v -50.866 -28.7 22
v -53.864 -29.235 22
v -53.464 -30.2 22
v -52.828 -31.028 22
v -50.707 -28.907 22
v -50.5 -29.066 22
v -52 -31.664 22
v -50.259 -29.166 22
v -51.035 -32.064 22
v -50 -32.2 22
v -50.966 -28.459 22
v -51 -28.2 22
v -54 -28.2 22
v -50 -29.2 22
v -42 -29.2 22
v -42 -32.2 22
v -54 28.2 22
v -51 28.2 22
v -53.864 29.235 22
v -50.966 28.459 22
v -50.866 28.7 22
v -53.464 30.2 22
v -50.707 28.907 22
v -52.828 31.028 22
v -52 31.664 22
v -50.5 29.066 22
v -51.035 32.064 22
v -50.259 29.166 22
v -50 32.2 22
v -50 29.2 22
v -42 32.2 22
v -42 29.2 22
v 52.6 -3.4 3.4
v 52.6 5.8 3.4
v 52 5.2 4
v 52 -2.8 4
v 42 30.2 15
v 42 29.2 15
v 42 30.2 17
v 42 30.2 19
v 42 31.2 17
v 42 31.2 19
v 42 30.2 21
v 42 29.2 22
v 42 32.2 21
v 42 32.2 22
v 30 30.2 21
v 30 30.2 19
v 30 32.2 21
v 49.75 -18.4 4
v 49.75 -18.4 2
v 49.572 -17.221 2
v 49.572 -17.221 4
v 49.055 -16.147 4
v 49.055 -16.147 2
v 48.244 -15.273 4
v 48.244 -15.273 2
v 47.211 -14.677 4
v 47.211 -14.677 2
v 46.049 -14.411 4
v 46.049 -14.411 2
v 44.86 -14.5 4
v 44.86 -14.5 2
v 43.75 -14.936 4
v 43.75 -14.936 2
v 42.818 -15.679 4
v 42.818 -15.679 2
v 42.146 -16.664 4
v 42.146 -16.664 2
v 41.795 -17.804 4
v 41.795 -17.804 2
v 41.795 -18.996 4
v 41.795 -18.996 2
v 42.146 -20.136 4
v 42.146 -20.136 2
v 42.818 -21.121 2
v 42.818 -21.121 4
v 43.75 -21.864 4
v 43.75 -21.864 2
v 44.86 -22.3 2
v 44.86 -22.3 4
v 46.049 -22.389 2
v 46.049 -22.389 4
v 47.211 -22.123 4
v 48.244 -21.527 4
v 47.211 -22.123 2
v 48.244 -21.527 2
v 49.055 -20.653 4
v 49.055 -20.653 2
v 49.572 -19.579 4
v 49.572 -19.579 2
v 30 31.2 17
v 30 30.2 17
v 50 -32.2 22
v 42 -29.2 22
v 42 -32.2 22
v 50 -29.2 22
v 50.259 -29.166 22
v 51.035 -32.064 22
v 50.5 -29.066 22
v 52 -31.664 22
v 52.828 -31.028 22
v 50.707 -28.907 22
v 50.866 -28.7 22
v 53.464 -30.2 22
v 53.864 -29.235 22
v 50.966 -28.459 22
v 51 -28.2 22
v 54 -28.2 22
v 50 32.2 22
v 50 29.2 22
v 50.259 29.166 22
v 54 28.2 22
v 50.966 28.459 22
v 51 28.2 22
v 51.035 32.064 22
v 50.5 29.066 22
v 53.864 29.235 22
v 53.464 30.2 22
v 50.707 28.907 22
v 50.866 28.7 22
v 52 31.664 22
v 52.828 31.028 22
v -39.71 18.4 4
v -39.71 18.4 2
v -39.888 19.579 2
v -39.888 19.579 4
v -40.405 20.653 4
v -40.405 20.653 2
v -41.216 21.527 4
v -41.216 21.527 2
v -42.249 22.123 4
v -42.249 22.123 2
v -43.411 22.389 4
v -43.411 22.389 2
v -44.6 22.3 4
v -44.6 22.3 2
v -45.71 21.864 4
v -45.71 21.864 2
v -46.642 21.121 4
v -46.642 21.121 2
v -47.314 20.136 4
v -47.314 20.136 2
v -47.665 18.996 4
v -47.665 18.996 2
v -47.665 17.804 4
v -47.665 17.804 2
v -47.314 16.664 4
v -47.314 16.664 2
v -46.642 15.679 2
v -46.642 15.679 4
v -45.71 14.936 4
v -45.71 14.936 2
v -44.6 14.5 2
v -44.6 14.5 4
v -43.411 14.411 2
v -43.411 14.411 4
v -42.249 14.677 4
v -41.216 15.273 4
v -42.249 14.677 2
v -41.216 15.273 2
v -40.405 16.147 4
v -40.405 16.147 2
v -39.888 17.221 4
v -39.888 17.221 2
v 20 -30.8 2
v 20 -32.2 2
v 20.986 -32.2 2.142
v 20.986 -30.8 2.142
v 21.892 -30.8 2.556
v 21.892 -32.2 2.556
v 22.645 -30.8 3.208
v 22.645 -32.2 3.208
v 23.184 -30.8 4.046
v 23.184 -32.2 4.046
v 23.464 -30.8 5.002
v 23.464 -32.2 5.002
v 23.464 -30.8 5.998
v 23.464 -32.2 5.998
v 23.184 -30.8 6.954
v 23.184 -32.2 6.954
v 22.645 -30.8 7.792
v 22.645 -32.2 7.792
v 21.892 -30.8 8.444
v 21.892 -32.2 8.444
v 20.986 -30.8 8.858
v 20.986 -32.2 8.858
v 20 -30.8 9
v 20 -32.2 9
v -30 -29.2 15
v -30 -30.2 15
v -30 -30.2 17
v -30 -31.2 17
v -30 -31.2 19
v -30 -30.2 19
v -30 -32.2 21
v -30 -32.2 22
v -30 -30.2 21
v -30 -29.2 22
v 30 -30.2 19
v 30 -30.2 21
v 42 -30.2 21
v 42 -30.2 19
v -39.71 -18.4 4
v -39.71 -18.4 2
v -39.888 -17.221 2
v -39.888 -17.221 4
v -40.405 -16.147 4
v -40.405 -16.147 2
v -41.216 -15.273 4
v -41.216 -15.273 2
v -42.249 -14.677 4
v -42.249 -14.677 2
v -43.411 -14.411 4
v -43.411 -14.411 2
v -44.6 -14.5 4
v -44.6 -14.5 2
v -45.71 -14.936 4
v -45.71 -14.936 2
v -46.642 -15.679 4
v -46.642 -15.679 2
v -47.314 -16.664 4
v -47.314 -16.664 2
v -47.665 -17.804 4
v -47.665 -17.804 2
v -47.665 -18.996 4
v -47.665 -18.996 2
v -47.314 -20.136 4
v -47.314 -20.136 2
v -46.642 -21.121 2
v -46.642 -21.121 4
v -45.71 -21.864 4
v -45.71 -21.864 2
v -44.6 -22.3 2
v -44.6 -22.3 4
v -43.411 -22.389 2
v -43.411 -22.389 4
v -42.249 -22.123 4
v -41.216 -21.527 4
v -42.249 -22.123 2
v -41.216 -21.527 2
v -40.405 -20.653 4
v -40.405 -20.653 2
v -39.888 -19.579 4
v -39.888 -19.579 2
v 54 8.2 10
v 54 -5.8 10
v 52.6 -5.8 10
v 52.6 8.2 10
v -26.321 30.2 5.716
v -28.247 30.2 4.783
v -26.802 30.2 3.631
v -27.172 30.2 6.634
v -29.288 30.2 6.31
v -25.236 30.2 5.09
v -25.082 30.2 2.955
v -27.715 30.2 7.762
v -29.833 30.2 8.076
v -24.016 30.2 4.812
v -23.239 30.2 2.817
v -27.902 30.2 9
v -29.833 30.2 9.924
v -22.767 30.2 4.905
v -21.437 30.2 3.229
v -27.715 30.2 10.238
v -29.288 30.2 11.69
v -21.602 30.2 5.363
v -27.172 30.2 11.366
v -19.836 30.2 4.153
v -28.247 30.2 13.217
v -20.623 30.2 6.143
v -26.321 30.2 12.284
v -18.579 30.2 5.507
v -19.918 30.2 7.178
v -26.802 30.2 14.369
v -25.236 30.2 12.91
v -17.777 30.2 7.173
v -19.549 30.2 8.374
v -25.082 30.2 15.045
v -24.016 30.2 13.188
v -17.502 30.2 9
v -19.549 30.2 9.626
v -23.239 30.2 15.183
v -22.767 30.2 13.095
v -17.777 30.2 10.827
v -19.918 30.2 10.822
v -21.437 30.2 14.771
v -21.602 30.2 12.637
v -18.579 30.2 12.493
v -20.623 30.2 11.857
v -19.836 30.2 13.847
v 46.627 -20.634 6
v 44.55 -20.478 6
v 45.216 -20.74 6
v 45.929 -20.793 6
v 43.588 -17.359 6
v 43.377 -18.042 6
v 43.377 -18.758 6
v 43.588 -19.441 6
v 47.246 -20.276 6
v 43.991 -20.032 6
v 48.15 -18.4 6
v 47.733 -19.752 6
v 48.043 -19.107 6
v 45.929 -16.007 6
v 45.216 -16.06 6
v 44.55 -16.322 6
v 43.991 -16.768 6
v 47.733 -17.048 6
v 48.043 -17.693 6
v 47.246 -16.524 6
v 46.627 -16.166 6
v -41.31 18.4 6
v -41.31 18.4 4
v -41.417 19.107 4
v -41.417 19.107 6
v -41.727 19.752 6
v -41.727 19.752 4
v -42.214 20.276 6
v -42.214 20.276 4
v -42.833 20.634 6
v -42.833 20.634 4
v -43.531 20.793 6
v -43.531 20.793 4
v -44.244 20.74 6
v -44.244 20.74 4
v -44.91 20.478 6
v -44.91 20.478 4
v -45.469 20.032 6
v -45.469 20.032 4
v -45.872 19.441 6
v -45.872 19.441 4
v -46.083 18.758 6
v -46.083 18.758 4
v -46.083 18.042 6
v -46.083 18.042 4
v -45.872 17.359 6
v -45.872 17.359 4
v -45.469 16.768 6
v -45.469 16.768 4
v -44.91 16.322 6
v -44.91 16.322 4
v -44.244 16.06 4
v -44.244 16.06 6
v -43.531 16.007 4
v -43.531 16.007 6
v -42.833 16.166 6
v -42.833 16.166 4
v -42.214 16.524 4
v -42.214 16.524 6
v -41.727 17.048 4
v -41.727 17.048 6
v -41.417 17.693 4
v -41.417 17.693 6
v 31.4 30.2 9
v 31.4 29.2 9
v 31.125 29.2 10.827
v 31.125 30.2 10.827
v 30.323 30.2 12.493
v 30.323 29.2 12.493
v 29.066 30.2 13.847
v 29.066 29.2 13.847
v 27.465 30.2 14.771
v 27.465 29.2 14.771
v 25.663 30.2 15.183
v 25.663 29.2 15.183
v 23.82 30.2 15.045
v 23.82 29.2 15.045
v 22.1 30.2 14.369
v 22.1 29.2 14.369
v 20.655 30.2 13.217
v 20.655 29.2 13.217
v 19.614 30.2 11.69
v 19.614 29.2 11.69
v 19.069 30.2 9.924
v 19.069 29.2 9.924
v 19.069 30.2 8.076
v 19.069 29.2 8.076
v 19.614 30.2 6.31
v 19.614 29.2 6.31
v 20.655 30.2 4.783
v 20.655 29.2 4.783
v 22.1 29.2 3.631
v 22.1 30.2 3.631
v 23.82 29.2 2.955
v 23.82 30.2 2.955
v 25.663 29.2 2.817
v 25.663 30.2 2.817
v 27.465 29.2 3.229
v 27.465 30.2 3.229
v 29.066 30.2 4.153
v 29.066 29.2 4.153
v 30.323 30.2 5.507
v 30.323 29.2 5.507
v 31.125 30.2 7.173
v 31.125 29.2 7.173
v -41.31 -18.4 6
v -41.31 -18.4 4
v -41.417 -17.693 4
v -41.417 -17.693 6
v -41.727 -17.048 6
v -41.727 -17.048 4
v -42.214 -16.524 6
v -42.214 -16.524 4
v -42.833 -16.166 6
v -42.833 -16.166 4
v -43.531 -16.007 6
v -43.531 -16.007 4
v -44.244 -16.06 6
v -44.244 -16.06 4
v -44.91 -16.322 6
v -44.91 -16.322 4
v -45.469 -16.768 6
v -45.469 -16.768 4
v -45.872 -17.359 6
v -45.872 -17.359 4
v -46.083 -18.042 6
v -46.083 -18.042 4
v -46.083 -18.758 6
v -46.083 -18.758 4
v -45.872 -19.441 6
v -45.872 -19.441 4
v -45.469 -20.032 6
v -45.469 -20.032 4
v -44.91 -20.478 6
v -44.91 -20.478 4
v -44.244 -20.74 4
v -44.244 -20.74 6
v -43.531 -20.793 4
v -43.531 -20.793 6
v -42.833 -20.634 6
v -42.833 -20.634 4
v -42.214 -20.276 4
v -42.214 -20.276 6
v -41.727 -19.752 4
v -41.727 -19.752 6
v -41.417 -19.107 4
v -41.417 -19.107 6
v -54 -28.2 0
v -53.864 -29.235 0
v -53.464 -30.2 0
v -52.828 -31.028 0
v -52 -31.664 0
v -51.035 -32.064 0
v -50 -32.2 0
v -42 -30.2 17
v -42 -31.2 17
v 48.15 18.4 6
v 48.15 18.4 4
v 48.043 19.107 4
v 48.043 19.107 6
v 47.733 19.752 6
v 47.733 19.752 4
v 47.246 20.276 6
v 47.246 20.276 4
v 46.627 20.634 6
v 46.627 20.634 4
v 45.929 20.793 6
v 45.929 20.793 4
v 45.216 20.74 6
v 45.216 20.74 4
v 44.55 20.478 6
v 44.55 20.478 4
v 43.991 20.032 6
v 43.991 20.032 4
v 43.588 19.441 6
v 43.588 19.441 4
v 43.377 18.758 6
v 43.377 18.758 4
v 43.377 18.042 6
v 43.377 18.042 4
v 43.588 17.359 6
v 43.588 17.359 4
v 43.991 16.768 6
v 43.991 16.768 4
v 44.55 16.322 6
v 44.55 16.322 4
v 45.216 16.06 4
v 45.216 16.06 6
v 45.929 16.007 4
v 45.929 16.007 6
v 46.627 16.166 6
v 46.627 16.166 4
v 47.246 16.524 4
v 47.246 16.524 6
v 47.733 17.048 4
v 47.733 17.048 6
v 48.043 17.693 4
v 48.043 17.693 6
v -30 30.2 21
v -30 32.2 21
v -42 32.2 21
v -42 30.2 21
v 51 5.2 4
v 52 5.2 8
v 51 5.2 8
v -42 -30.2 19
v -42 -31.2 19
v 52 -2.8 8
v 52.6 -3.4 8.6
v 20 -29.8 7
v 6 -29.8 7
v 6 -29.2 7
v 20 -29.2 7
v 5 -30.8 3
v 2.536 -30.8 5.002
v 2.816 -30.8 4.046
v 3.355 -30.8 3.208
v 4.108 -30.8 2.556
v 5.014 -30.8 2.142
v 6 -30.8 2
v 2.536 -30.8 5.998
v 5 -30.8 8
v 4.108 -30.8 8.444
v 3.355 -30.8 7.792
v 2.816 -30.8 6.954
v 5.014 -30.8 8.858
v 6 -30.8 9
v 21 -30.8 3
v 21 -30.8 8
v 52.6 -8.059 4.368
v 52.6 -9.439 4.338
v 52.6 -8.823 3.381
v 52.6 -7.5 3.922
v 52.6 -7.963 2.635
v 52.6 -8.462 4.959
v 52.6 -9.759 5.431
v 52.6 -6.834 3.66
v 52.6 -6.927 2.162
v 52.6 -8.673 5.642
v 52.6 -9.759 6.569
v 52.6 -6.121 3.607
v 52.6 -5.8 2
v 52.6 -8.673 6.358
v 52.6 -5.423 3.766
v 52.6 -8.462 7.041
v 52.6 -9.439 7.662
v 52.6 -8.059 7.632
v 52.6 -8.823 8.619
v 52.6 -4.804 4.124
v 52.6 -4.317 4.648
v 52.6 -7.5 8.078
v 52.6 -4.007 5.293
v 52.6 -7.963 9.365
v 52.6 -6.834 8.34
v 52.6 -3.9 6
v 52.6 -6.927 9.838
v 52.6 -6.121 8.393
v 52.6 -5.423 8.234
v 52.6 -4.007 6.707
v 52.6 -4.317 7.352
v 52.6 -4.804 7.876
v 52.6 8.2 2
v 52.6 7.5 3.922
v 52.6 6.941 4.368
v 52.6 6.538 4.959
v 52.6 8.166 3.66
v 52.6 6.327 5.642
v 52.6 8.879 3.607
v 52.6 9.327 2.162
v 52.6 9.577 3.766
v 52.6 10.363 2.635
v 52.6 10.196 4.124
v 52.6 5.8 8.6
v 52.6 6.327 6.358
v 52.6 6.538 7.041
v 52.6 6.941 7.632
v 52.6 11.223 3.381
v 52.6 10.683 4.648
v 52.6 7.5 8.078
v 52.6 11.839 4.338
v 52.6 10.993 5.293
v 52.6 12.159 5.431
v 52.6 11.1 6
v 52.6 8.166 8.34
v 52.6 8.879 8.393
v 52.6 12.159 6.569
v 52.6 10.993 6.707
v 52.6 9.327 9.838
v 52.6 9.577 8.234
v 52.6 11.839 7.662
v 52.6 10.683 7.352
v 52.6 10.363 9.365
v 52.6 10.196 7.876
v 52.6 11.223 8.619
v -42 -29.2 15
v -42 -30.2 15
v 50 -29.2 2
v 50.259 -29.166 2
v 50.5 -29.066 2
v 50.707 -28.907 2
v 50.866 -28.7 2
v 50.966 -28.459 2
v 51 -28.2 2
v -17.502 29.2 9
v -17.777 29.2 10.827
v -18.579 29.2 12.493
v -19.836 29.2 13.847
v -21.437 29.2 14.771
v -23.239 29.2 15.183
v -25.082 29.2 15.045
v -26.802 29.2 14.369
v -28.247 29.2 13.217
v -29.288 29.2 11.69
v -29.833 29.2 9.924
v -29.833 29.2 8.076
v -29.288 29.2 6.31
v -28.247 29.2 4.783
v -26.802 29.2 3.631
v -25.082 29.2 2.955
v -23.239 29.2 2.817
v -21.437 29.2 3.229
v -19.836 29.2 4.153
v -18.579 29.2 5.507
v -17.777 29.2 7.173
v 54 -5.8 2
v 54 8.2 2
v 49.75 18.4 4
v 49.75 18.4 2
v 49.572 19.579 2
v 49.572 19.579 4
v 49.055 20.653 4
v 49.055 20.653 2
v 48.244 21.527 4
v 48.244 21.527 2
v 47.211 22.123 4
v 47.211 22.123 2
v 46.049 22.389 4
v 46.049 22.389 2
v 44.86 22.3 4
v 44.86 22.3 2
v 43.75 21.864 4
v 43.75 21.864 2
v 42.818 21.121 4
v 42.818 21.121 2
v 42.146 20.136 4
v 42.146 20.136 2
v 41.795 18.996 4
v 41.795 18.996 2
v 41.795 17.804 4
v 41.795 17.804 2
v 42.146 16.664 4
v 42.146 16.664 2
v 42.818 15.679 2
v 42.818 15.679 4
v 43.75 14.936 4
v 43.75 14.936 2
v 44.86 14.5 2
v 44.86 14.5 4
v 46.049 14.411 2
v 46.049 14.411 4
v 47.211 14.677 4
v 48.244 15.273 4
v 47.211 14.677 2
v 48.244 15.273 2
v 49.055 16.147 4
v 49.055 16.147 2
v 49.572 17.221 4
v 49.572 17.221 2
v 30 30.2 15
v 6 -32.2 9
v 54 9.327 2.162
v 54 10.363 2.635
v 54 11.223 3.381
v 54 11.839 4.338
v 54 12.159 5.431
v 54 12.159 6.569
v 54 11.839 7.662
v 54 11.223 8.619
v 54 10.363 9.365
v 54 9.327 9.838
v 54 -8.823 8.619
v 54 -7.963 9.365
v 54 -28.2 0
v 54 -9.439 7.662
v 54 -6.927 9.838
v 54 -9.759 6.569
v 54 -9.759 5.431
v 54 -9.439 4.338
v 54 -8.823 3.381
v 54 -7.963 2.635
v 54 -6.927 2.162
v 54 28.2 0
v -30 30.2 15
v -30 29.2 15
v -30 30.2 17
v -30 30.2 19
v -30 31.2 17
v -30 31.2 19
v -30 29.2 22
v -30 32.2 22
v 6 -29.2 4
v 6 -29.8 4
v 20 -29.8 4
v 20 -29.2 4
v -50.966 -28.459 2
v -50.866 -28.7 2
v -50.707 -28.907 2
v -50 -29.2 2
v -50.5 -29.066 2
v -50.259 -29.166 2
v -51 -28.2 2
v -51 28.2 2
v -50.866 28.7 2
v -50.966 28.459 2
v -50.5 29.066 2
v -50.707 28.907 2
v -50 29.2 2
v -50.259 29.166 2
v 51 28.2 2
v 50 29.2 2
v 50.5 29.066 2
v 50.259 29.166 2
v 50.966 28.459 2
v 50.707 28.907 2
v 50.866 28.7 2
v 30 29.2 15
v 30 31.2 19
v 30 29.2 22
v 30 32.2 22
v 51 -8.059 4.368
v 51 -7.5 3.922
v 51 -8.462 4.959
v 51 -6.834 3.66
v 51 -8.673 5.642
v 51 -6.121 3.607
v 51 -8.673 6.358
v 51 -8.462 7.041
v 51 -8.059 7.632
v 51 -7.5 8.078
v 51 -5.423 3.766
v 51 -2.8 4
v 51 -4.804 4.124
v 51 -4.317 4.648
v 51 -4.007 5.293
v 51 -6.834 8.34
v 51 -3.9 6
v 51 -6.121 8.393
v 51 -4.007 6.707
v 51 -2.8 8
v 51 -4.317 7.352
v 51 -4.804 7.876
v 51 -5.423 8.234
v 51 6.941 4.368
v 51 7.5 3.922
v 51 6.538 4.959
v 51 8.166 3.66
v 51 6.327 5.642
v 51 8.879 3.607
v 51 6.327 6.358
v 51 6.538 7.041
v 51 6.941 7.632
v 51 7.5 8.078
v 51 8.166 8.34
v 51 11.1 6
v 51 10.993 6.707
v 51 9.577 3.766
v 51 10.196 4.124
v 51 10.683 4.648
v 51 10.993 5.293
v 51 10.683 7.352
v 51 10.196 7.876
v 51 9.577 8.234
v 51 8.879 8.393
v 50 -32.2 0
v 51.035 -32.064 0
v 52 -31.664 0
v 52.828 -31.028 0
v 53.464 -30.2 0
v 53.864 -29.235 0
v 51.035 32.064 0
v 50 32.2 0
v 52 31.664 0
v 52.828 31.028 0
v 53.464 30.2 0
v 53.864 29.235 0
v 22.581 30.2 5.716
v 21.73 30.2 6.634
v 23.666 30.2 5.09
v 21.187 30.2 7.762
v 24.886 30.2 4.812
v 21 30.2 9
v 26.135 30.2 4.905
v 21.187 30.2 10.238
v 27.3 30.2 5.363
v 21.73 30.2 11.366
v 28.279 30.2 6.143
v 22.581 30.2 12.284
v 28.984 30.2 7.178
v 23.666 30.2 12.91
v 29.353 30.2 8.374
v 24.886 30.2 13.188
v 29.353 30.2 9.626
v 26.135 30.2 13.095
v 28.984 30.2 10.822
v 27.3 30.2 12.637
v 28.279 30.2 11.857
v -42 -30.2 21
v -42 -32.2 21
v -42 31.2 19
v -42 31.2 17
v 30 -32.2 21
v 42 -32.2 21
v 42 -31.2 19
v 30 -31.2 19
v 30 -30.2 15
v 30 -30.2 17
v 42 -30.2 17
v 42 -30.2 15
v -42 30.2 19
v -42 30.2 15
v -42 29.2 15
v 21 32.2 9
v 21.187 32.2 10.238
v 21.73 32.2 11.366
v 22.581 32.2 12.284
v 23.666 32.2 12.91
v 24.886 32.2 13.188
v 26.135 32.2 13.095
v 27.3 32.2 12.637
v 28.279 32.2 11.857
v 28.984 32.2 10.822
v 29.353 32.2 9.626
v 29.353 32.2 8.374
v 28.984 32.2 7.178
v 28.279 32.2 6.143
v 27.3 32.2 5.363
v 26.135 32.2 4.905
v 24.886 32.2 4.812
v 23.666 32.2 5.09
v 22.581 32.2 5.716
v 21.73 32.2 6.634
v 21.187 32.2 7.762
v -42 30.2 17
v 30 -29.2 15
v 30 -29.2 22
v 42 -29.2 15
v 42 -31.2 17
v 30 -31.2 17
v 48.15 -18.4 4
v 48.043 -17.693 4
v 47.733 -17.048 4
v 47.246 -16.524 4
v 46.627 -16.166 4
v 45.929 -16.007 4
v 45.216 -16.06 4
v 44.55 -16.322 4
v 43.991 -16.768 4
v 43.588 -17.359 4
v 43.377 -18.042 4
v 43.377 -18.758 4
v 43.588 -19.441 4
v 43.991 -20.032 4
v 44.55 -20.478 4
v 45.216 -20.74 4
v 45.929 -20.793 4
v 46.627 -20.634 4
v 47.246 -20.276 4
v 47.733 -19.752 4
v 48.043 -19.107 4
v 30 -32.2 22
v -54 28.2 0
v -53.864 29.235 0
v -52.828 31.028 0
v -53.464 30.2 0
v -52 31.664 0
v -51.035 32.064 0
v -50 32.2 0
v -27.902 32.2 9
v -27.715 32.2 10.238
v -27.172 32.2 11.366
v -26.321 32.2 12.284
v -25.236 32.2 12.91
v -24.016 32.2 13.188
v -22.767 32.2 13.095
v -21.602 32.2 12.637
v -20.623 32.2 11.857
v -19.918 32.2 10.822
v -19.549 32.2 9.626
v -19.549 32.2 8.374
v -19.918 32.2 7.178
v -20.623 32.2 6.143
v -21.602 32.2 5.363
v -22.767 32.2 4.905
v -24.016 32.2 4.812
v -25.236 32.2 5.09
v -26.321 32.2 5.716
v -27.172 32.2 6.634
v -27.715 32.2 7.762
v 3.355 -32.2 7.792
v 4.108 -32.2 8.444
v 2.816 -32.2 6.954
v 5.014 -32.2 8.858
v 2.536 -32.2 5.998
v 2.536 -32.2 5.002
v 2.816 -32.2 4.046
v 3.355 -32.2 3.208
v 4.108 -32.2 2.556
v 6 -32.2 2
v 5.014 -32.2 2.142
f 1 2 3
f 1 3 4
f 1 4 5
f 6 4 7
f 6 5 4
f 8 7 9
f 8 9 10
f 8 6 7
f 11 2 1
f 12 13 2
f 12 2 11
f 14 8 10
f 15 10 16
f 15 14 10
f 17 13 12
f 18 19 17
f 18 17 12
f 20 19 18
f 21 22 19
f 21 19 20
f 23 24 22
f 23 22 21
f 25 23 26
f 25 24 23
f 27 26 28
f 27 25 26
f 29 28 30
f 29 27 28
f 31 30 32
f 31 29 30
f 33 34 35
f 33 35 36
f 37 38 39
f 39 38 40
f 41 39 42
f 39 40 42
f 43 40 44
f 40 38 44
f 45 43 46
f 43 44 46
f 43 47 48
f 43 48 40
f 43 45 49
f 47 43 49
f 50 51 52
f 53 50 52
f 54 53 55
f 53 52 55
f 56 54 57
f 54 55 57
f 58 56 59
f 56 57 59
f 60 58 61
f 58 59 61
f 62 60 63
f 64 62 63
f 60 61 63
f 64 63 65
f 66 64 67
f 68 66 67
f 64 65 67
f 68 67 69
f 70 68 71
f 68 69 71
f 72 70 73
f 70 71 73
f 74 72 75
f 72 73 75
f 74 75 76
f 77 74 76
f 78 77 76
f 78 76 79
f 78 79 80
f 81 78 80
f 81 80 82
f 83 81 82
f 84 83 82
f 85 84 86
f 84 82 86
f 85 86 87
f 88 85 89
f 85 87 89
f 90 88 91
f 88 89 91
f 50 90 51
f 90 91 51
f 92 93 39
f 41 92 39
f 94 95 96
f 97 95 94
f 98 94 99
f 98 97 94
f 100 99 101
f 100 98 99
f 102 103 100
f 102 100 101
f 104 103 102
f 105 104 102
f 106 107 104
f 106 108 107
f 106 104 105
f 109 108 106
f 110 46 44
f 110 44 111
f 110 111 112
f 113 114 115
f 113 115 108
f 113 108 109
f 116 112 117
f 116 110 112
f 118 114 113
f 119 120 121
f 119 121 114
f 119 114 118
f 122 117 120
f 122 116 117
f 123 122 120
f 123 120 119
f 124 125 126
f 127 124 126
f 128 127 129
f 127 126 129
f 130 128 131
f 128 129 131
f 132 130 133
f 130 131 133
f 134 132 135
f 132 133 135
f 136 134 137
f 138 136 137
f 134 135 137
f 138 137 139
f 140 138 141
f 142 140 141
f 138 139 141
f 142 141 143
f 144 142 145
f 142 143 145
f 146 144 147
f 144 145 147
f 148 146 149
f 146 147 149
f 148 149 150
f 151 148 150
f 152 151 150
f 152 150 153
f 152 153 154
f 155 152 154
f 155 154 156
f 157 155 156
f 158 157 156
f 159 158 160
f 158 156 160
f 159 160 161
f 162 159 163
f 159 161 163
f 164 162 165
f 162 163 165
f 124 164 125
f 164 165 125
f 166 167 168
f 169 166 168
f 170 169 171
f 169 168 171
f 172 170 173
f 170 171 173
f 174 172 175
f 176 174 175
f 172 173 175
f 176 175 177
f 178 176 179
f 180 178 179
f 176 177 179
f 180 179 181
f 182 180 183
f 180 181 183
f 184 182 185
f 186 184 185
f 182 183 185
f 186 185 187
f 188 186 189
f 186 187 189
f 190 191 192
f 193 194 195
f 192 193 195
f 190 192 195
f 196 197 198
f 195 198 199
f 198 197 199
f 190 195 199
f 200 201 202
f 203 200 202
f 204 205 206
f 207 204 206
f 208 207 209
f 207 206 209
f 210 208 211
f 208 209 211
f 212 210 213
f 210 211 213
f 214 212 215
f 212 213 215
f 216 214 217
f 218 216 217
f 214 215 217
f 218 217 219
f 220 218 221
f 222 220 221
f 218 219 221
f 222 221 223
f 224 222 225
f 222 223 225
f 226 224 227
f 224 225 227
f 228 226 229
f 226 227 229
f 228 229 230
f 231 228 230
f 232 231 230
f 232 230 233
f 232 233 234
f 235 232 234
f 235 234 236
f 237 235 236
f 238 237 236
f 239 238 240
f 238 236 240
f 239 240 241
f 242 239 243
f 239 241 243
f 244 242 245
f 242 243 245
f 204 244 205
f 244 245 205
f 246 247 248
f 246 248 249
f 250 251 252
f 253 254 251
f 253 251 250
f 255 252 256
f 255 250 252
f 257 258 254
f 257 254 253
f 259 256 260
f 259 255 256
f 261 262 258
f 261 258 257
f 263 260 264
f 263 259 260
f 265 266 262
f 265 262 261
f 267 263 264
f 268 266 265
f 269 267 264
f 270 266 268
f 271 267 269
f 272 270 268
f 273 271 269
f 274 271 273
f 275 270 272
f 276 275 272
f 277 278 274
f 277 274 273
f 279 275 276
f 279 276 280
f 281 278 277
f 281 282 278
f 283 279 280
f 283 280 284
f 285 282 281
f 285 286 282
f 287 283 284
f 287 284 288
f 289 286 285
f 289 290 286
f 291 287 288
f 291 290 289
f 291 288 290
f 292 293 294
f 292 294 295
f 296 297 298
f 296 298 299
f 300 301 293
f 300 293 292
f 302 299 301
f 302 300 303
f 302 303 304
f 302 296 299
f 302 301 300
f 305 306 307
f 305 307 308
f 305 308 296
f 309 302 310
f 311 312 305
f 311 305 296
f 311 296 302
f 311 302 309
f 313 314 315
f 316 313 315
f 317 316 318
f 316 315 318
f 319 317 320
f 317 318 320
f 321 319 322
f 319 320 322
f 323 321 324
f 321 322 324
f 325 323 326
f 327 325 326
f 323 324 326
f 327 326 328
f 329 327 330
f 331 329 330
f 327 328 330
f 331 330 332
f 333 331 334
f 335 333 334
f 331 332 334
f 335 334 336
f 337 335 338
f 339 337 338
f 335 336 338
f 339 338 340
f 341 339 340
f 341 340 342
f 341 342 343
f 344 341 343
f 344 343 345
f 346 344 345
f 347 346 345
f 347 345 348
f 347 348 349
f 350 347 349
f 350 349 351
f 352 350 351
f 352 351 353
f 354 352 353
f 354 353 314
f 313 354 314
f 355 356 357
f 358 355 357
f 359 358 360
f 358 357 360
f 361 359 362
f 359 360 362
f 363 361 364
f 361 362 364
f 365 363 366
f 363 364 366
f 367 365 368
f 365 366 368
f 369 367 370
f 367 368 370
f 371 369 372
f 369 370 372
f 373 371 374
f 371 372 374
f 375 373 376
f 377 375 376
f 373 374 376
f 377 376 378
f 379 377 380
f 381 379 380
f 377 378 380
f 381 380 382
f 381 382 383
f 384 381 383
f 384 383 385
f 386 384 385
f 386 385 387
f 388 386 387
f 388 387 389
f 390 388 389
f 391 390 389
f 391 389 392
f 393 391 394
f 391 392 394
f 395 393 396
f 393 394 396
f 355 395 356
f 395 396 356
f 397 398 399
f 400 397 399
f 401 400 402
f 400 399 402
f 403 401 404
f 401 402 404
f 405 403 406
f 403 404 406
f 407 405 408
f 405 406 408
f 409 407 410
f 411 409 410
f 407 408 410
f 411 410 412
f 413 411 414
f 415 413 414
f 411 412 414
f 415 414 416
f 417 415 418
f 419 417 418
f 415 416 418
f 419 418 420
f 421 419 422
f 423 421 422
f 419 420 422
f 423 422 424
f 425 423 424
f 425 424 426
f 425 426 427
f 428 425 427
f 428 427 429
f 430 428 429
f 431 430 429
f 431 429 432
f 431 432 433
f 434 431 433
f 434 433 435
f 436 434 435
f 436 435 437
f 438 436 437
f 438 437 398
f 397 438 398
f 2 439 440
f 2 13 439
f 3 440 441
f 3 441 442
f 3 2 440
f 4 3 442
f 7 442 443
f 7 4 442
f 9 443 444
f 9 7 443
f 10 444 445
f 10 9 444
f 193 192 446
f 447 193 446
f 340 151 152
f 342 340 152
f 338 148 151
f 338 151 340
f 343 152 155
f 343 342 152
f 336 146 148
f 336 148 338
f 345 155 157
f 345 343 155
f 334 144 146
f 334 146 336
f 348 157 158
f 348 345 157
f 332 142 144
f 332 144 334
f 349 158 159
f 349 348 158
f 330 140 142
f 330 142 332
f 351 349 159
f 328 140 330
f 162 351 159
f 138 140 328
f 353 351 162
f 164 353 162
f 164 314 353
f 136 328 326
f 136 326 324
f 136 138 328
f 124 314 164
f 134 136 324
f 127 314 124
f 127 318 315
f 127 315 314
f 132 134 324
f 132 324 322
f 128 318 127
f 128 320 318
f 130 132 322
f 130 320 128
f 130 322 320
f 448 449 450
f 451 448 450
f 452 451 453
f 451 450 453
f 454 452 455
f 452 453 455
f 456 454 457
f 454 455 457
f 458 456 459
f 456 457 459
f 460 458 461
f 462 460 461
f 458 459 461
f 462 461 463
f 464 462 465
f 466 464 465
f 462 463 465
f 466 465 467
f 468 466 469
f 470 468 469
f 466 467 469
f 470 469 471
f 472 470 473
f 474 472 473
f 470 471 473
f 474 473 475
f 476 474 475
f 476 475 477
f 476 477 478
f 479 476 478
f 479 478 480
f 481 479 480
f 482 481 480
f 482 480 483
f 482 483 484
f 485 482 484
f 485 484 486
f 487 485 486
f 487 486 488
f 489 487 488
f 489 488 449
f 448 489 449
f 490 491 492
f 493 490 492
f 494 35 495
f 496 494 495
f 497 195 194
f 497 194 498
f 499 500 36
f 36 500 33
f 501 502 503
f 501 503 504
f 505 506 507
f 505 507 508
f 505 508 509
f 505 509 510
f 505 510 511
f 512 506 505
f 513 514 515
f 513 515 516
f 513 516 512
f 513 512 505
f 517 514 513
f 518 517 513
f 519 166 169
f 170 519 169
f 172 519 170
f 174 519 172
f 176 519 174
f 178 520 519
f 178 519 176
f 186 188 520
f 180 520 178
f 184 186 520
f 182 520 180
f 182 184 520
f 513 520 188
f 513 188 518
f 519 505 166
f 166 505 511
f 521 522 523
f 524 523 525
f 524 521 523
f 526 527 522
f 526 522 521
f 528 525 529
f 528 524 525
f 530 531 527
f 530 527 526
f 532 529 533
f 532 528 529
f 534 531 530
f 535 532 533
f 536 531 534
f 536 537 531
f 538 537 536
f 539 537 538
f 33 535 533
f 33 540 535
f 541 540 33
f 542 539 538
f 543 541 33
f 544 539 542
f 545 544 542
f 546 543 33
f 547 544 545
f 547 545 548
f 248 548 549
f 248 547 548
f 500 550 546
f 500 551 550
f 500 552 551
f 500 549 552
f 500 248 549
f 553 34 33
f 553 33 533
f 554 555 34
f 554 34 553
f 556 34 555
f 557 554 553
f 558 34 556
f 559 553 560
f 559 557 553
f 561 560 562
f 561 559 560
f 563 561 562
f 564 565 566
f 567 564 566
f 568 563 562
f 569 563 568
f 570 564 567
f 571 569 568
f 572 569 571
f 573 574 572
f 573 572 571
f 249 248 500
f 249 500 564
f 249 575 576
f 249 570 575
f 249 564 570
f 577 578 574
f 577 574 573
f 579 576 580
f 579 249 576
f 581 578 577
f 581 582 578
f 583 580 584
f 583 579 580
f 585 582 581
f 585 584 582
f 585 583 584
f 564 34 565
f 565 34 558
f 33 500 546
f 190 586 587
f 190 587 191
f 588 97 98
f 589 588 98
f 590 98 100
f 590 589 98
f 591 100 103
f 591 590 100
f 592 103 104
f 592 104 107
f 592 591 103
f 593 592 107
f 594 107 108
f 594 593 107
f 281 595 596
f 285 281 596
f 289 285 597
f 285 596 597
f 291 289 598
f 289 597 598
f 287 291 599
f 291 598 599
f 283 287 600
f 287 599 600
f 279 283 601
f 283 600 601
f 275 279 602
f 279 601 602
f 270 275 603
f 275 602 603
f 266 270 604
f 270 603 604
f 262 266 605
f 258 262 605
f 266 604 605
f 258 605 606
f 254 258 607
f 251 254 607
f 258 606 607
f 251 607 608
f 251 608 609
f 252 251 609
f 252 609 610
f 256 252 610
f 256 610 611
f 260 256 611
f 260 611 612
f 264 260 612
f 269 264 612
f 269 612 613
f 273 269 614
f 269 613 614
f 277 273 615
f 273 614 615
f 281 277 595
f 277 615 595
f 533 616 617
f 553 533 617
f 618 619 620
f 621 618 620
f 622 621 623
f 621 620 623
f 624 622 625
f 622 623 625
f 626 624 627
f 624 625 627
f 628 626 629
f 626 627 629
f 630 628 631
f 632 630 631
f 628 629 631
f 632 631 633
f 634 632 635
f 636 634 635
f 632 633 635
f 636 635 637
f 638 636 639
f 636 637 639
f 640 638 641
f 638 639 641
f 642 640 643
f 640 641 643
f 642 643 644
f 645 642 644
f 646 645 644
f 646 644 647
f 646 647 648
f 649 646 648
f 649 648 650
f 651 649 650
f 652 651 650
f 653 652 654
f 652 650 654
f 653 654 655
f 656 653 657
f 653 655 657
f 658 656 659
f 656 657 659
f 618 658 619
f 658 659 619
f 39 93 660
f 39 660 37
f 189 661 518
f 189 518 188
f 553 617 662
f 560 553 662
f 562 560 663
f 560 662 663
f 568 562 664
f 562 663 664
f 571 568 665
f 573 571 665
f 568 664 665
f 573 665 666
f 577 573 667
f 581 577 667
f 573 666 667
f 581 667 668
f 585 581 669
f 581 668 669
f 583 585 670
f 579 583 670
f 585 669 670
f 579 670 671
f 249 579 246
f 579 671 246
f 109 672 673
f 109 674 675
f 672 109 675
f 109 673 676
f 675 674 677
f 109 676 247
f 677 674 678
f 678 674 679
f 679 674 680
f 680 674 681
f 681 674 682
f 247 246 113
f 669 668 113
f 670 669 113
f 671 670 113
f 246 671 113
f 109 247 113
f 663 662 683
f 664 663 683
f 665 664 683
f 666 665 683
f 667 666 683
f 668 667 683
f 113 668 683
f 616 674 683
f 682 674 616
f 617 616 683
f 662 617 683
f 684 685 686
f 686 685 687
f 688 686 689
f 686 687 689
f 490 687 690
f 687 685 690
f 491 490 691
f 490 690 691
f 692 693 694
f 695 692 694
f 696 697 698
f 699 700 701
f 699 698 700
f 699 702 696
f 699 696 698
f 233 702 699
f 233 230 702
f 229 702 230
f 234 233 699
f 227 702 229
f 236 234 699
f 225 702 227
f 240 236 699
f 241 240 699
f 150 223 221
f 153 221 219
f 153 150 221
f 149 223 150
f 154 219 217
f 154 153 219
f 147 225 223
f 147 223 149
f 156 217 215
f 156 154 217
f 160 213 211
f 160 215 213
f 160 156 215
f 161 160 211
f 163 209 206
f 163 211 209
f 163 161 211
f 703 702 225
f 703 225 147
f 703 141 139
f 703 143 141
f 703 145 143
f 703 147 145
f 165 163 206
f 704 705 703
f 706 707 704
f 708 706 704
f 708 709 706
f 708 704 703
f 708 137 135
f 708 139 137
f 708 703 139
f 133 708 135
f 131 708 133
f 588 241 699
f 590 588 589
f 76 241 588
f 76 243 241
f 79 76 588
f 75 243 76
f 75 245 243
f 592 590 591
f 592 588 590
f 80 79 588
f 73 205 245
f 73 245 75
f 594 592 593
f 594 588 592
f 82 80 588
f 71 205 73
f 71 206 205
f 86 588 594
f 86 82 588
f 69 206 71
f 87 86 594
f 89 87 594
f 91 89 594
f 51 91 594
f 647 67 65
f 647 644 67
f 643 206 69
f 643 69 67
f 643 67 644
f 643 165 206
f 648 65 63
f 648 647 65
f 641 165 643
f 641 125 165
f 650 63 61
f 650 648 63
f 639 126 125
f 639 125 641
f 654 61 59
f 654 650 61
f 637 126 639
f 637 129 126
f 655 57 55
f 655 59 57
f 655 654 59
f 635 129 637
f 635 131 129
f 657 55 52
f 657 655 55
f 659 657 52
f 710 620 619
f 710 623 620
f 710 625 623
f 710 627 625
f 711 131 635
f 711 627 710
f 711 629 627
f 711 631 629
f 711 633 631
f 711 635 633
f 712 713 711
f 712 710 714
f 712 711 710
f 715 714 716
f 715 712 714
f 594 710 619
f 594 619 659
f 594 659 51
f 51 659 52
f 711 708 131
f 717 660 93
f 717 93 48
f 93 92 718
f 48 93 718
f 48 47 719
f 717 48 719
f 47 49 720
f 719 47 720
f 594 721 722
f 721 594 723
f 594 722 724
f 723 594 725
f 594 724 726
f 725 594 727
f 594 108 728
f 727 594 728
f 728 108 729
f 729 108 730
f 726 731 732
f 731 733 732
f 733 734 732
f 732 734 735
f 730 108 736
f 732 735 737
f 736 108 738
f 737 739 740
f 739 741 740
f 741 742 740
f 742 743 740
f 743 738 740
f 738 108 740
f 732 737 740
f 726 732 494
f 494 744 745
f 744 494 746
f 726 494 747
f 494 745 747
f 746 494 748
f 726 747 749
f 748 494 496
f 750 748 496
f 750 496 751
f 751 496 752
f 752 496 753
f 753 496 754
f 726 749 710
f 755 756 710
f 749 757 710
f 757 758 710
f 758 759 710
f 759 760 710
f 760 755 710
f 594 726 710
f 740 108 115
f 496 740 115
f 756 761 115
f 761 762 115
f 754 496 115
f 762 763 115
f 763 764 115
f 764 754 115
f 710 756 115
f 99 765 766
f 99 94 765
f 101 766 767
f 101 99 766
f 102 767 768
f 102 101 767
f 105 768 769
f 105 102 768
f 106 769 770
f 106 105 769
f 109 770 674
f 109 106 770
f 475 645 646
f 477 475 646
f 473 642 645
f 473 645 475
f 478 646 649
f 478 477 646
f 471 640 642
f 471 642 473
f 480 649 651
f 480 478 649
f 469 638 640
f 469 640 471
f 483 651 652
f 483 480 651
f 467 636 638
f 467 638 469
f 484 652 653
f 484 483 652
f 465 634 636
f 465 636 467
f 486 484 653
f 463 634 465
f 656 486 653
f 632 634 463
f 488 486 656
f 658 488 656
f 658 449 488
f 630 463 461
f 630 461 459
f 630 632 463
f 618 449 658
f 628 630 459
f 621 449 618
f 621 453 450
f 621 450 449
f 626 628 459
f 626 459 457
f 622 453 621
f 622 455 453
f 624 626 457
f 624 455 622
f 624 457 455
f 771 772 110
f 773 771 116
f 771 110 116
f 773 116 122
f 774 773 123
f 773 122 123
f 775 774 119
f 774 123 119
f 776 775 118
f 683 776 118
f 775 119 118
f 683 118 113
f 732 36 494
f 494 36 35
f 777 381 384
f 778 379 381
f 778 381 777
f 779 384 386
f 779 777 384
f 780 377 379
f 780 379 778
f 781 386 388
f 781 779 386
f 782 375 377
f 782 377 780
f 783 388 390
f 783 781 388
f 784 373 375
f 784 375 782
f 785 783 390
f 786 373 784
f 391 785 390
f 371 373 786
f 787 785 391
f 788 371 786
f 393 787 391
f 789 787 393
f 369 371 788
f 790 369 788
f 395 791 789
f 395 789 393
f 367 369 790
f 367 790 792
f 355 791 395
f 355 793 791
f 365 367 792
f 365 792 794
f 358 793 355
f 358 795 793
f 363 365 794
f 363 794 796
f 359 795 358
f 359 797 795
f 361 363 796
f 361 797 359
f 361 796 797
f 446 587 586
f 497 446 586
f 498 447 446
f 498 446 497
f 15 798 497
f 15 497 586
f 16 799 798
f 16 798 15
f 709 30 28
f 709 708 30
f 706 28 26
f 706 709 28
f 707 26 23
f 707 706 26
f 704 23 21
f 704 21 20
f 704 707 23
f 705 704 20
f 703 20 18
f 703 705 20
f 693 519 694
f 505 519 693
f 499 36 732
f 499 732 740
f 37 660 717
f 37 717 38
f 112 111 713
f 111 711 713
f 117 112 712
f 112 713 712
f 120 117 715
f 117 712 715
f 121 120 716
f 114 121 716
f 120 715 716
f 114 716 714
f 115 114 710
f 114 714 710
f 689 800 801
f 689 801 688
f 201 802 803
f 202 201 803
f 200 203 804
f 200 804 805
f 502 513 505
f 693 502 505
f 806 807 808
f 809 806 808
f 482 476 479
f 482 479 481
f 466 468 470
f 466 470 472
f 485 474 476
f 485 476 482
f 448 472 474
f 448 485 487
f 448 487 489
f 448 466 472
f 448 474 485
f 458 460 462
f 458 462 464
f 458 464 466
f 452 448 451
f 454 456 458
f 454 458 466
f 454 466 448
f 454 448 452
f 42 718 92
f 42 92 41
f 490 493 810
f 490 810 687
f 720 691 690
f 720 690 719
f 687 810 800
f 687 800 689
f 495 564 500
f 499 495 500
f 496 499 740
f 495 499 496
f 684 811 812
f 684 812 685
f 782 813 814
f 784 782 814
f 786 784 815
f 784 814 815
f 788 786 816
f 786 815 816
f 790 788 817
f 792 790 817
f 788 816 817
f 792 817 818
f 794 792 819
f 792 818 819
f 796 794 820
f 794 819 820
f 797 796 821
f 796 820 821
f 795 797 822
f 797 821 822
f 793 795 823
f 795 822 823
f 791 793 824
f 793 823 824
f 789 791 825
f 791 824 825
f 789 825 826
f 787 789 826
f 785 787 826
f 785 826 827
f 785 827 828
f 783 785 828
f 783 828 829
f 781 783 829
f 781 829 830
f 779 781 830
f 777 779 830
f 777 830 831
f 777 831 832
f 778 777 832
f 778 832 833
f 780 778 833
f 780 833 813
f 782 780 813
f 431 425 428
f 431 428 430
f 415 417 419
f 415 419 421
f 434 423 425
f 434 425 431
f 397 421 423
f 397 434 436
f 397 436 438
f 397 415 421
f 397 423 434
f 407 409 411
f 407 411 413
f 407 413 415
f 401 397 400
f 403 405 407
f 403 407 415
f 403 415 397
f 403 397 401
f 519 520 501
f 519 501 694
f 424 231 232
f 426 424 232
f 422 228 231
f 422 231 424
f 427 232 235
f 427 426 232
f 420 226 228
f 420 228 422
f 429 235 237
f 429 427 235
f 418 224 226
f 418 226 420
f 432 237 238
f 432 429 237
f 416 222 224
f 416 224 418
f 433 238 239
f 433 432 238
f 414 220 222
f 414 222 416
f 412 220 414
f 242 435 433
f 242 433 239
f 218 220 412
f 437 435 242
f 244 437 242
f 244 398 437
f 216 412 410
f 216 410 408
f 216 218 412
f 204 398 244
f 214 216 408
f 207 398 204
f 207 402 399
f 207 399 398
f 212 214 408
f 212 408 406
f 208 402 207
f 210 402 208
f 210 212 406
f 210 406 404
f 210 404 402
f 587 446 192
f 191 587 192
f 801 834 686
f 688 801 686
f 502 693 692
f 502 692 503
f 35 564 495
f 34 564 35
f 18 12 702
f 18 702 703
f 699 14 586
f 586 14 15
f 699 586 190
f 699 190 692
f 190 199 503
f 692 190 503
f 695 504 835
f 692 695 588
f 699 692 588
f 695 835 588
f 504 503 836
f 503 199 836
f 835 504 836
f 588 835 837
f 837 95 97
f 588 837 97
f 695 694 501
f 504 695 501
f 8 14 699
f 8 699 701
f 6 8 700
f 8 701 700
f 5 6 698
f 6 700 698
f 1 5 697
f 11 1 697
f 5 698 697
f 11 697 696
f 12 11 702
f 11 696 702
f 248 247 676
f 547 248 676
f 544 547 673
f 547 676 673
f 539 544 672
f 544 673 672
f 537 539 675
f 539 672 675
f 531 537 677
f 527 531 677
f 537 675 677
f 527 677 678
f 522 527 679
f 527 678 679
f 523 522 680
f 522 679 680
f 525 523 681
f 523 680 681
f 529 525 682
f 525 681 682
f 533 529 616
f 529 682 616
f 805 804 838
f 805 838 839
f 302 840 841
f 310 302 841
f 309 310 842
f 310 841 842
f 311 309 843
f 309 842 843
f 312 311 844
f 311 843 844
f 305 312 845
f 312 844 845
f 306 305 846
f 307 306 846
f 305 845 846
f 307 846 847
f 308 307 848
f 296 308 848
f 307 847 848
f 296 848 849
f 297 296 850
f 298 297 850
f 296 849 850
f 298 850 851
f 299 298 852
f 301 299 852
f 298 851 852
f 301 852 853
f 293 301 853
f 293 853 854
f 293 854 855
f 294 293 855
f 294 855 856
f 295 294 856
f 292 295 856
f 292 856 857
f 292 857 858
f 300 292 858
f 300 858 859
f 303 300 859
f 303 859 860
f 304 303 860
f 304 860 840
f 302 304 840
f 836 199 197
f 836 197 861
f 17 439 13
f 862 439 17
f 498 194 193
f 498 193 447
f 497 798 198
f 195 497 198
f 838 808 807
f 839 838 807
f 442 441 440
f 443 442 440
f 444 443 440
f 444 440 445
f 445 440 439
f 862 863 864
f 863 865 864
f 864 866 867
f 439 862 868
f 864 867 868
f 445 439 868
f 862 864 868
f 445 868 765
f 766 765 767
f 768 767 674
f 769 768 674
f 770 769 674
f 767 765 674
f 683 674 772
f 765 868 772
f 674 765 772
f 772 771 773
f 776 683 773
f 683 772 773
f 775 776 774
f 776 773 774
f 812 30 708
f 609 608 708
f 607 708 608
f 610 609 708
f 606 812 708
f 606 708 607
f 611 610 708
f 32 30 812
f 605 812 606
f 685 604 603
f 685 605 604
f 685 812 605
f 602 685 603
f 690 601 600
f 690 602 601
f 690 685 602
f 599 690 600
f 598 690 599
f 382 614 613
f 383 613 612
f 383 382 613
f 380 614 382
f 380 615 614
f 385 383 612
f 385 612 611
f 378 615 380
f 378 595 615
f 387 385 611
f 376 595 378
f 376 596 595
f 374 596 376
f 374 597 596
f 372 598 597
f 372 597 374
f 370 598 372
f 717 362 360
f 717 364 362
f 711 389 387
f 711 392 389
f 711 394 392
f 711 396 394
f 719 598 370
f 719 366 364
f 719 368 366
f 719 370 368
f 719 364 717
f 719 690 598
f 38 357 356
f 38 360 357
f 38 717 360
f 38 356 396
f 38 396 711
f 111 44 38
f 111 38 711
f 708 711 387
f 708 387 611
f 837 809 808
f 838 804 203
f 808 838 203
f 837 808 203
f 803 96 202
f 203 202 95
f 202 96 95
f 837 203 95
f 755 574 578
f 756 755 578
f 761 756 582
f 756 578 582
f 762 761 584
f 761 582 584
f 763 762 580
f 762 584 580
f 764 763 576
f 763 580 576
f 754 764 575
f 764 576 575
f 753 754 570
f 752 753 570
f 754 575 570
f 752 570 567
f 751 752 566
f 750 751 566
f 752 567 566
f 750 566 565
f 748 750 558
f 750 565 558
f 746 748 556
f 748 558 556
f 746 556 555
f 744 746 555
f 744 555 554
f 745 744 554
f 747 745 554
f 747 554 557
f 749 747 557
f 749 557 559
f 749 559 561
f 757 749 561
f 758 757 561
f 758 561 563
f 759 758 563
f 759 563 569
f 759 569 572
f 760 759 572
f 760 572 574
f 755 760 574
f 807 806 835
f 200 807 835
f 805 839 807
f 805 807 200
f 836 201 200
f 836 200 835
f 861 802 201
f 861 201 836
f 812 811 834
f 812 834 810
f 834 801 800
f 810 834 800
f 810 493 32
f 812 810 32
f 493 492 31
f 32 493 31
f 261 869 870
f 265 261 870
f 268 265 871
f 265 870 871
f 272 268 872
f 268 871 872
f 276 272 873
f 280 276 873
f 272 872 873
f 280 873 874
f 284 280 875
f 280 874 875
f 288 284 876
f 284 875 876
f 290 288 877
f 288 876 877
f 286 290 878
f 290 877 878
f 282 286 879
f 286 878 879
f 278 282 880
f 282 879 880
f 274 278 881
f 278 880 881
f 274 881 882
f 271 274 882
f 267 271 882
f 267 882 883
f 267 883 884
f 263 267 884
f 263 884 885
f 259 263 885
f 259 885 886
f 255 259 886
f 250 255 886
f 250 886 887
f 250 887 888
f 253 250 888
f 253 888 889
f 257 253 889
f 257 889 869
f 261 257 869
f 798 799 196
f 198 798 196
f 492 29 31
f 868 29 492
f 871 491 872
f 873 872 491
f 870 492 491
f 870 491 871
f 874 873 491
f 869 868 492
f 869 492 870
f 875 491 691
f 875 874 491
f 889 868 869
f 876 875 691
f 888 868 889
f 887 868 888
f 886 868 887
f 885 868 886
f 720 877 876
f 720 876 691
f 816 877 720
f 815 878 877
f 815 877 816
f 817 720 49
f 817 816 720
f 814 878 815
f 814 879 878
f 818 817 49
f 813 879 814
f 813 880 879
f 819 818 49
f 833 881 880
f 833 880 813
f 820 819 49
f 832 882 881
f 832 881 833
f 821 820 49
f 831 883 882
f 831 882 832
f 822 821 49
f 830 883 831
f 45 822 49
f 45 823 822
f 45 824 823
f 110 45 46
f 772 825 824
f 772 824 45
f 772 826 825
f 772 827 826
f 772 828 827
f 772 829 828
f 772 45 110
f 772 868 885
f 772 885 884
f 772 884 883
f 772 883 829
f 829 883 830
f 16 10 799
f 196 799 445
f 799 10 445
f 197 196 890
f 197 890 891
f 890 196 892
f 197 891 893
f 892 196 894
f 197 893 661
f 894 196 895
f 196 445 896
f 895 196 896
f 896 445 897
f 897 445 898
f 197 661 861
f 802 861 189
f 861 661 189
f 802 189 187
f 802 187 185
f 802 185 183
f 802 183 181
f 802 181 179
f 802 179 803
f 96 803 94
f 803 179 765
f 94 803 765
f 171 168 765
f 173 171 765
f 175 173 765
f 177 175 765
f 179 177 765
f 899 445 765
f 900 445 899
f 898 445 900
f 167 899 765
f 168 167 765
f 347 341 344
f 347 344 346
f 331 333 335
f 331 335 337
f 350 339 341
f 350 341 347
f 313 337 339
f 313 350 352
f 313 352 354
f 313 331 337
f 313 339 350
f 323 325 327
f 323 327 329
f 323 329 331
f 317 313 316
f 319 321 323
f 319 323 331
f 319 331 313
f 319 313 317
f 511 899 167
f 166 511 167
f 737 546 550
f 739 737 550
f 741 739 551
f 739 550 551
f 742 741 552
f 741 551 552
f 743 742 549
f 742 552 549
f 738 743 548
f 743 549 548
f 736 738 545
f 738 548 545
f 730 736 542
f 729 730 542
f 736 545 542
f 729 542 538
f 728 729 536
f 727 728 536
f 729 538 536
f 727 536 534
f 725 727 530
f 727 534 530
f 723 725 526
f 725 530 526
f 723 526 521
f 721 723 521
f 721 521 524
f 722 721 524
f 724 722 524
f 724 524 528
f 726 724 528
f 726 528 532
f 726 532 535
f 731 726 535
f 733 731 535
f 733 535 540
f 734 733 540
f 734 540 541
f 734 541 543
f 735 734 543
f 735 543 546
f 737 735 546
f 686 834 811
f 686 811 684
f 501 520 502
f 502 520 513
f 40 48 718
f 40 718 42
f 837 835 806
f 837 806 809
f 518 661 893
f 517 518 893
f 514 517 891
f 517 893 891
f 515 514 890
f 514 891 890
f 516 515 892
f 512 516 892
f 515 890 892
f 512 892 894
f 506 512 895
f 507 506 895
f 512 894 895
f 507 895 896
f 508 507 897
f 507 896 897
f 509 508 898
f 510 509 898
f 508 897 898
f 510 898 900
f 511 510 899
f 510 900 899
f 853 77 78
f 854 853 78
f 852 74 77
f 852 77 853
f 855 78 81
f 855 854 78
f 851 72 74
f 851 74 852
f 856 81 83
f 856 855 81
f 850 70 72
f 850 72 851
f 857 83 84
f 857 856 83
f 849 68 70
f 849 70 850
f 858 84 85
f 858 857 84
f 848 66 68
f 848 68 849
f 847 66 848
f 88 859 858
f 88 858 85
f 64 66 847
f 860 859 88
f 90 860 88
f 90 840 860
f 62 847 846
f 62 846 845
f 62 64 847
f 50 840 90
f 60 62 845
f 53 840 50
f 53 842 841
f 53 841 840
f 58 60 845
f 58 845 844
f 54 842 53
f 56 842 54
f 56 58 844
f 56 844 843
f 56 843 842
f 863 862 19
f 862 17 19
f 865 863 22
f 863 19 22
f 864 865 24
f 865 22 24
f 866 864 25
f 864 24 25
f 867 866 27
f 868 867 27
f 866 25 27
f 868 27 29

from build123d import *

# Parameters (mm, degrees)
SKETCH_W        = 108
SKETCH_H        = 64.4
PAD_DEPTH       = 22
SKETCH001_W     = 102
SKETCH001_H     = 58.4
POCKET_DEPTH    = 20
SKETCH002_R     = 4
PAD001_DEPTH    = 2
SKETCH003_R     = 2.4
PAD002_DEPTH    = 4
SKETCH004_R     = 4.2
SKETCH004_W     = 12
SKETCH004_H     = 1
POCKET001_DEPTH = 3
SKETCH005_W     = 12
SKETCH005_H     = 1
SKETCH005_W_2   = 14
SKETCH005_H_2   = 3
POCKET002_DEPTH = 3
SKETCH006_R     = 2.4
SKETCH006_W     = 8
SKETCH006_H     = 4
POCKET003_DEPTH = 3
SKETCH007_W     = 12
SKETCH007_H     = 2
POCKET004_DEPTH = 2
SKETCH008_W     = 12
SKETCH008_H     = 2
POCKET005_DEPTH = 2
SKETCH009_W     = 12
SKETCH009_H     = 1
POCKET006_DEPTH = 7
POCKET007_DEPTH = 1.4
POCKET008_DEPTH = 1.4
FILLET_R        = 4
FILLET001_R     = 1
CHAMFER_SIZE    = 0.6
CHAMFER001_SIZE = 1
SKETCH012_R     = 6.2
POCKET009_DEPTH = 1


with BuildPart() as part:
    # Sketch → Pad (new body)
    with BuildSketch(Plane.XY):
        Rectangle(SKETCH_W, SKETCH_H)
    extrude(amount=PAD_DEPTH)

    # Sketch001 (on Face6 of Pad) → Pocket (cut)
    with BuildSketch(Plane.XY.offset(22)):
        Rectangle(SKETCH001_W, SKETCH001_H)
    extrude(amount=-POCKET_DEPTH, mode=Mode.SUBTRACT)

    # Sketch002 (on Face11 of Pocket) → Pad001 (join)
    with BuildSketch(Plane.XY.offset(2)):
        with Locations((-43.71, 18.4)):
            Circle(SKETCH002_R)
        with Locations((45.75, 18.4)):
            Circle(SKETCH002_R)
        with Locations((45.75, -18.4)):
            Circle(SKETCH002_R)
        with Locations((-43.71, -18.4)):
            Circle(SKETCH002_R)
    extrude(amount=PAD001_DEPTH)

    # Sketch003 (on Face11 of Pad001) → Pad002 (join)
    with BuildSketch(Plane.XY.offset(2)):
        with Locations((-43.71, 18.4)):
            Circle(SKETCH003_R)
        with Locations((45.75, 18.4)):
            Circle(SKETCH003_R)
        with Locations((45.75, -18.4)):
            Circle(SKETCH003_R)
        with Locations((-43.71, -18.4)):
            Circle(SKETCH003_R)
    extrude(amount=PAD002_DEPTH)

    # Sketch004 (on Face1 of Pad002) → Pocket001 (cut)
    with BuildSketch(Plane(origin=(0, 32.2, 0), x_dir=(-1, 0, 0), z_dir=(0, 1, 0))):
        with Locations((-25.2, 9)):
            Circle(SKETCH004_R)
        with Locations((23.702, 9)):
            Circle(SKETCH004_R)
        with Locations((-36, 21.5)):
            Rectangle(SKETCH004_W, SKETCH004_H)
        with Locations((36, 21.5)):
            Rectangle(SKETCH004_W, SKETCH004_H)
    extrude(amount=-POCKET001_DEPTH, mode=Mode.SUBTRACT)

    # Sketch005 (on Face15 of Pocket001) → Pocket002 (cut)
    with BuildSketch(Plane.XZ.offset(32.2)):
        with Locations((-36, 21.5)):
            Rectangle(SKETCH005_W, SKETCH005_H)
        with Locations((36, 21.5)):
            Rectangle(SKETCH005_W, SKETCH005_H)
        with Locations((13, 5.5)):
            Rectangle(SKETCH005_W_2, SKETCH005_H_2)
    extrude(amount=-POCKET002_DEPTH, mode=Mode.SUBTRACT)

    # Sketch006 (on Face3 of Pocket002) → Pocket003 (cut)
    with BuildSketch(Plane.YZ.offset(54)):
        with Locations((-6.3, 6)):
            Circle(SKETCH006_R)
        with Locations((8.7, 6)):
            Circle(SKETCH006_R)
        with Locations((1.2, 6)):
            Rectangle(SKETCH006_W, SKETCH006_H)
    extrude(amount=-POCKET003_DEPTH, mode=Mode.SUBTRACT)

    # Sketch007 (on Face23 of Pocket003) → Pocket004 (cut)
    with BuildSketch(Plane.XZ.offset(-29.2)):
        with Locations((-36, 18)):
            Rectangle(SKETCH007_W, SKETCH007_H)
        with Locations((36, 18)):
            Rectangle(SKETCH007_W, SKETCH007_H)
    extrude(amount=-POCKET004_DEPTH, mode=Mode.SUBTRACT)

    # Sketch008 (on Face25 of Pocket004) → Pocket005 (cut)
    with BuildSketch(Plane(origin=(0, -29.2, 0), x_dir=(-1, 0, 0), z_dir=(0, 1, 0))):
        with Locations((-36, 18)):
            Rectangle(SKETCH008_W, SKETCH008_H)
        with Locations((36, 18)):
            Rectangle(SKETCH008_W, SKETCH008_H)
    extrude(amount=-POCKET005_DEPTH, mode=Mode.SUBTRACT)

    # Sketch009 (on Face31 of Pocket005) → Pocket006 (cut)
    with BuildSketch(Plane.XY.offset(22)):
        with Locations((-36, 29.7)):
            Rectangle(SKETCH009_W, SKETCH009_H)
        with Locations((36, 29.7)):
            Rectangle(SKETCH009_W, SKETCH009_H)
        with Locations((36, -29.7)):
            Rectangle(SKETCH009_W, SKETCH009_H)
        with Locations((-36, -29.7)):
            Rectangle(SKETCH009_W, SKETCH009_H)
    extrude(amount=-POCKET006_DEPTH, mode=Mode.SUBTRACT)

    # Sketch010 (on Face16 of Pocket006) → Pocket007 (cut)
    with BuildSketch(Plane.XZ.offset(32.2)):
        with BuildLine():
            ThreePointArc((6, 9), (2.5, 5.5), (6, 2))
            Line((6, 2), (20, 2))
            ThreePointArc((20, 2), (23.5, 5.5), (20, 9))
            Line((6, 9), (20, 9))
        make_face()
    extrude(amount=-POCKET007_DEPTH, mode=Mode.SUBTRACT)

    # Sketch011 (on Face3 of Pocket007) → Pocket008 (cut)
    with BuildSketch(Plane.YZ.offset(54)):
        with BuildLine():
            ThreePointArc((-5.8, 10), (-9.8, 6), (-5.8, 2))
            Line((-5.8, 2), (8.2, 2))
            ThreePointArc((8.2, 2), (12.2, 6), (8.2, 10))
            Line((-5.8, 10), (8.2, 10))
        make_face()
    extrude(amount=-POCKET008_DEPTH, mode=Mode.SUBTRACT)

    # Fillet
    fillet_edges = [part.edges().sort_by_distance(p)[0] for p in [
        (54, -32.2, 11),
        (54, 32.2, 11),
        (-54, 32.2, 11),
        (-54, -32.2, 11),
    ]]
    fillet(fillet_edges, radius=FILLET_R)

    # Fillet001
    fillet001_edges = [part.edges().sort_by_distance(p)[0] for p in [
        (-51, 29.2, 12),
        (-51, -29.2, 12),
        (51, -29.2, 12),
        (51, 29.2, 12),
    ]]
    fillet(fillet001_edges, radius=FILLET001_R)

    # Chamfer
    chamfer_edges = [part.edges().sort_by_distance(p)[0] for p in [
        (52.6, 1.2, 8),
        (52.6, -2.8, 6),
        (52.6, 5.2, 6),
        (52.6, 1.2, 4),
    ]]
    chamfer(chamfer_edges, length=CHAMFER_SIZE)

    # Chamfer001
    chamfer001_edges = [part.edges().sort_by_distance(p)[0] for p in [
        (13, -30.8, 7),
        (6, -30.8, 5.5),
        (13, -30.8, 4),
        (20, -30.8, 5.5),
    ]]
    chamfer(chamfer001_edges, length=CHAMFER001_SIZE)

    # Sketch012 (on Face43 of Chamfer001) → Pocket009 (cut)
    with BuildSketch(Plane.XZ.offset(-29.2)):
        with Locations((-23.702, 9)):
            Circle(SKETCH012_R)
        with Locations((25.2, 9)):
            Circle(SKETCH012_R)
    extrude(amount=-POCKET009_DEPTH, mode=Mode.SUBTRACT)


solid = part.part
